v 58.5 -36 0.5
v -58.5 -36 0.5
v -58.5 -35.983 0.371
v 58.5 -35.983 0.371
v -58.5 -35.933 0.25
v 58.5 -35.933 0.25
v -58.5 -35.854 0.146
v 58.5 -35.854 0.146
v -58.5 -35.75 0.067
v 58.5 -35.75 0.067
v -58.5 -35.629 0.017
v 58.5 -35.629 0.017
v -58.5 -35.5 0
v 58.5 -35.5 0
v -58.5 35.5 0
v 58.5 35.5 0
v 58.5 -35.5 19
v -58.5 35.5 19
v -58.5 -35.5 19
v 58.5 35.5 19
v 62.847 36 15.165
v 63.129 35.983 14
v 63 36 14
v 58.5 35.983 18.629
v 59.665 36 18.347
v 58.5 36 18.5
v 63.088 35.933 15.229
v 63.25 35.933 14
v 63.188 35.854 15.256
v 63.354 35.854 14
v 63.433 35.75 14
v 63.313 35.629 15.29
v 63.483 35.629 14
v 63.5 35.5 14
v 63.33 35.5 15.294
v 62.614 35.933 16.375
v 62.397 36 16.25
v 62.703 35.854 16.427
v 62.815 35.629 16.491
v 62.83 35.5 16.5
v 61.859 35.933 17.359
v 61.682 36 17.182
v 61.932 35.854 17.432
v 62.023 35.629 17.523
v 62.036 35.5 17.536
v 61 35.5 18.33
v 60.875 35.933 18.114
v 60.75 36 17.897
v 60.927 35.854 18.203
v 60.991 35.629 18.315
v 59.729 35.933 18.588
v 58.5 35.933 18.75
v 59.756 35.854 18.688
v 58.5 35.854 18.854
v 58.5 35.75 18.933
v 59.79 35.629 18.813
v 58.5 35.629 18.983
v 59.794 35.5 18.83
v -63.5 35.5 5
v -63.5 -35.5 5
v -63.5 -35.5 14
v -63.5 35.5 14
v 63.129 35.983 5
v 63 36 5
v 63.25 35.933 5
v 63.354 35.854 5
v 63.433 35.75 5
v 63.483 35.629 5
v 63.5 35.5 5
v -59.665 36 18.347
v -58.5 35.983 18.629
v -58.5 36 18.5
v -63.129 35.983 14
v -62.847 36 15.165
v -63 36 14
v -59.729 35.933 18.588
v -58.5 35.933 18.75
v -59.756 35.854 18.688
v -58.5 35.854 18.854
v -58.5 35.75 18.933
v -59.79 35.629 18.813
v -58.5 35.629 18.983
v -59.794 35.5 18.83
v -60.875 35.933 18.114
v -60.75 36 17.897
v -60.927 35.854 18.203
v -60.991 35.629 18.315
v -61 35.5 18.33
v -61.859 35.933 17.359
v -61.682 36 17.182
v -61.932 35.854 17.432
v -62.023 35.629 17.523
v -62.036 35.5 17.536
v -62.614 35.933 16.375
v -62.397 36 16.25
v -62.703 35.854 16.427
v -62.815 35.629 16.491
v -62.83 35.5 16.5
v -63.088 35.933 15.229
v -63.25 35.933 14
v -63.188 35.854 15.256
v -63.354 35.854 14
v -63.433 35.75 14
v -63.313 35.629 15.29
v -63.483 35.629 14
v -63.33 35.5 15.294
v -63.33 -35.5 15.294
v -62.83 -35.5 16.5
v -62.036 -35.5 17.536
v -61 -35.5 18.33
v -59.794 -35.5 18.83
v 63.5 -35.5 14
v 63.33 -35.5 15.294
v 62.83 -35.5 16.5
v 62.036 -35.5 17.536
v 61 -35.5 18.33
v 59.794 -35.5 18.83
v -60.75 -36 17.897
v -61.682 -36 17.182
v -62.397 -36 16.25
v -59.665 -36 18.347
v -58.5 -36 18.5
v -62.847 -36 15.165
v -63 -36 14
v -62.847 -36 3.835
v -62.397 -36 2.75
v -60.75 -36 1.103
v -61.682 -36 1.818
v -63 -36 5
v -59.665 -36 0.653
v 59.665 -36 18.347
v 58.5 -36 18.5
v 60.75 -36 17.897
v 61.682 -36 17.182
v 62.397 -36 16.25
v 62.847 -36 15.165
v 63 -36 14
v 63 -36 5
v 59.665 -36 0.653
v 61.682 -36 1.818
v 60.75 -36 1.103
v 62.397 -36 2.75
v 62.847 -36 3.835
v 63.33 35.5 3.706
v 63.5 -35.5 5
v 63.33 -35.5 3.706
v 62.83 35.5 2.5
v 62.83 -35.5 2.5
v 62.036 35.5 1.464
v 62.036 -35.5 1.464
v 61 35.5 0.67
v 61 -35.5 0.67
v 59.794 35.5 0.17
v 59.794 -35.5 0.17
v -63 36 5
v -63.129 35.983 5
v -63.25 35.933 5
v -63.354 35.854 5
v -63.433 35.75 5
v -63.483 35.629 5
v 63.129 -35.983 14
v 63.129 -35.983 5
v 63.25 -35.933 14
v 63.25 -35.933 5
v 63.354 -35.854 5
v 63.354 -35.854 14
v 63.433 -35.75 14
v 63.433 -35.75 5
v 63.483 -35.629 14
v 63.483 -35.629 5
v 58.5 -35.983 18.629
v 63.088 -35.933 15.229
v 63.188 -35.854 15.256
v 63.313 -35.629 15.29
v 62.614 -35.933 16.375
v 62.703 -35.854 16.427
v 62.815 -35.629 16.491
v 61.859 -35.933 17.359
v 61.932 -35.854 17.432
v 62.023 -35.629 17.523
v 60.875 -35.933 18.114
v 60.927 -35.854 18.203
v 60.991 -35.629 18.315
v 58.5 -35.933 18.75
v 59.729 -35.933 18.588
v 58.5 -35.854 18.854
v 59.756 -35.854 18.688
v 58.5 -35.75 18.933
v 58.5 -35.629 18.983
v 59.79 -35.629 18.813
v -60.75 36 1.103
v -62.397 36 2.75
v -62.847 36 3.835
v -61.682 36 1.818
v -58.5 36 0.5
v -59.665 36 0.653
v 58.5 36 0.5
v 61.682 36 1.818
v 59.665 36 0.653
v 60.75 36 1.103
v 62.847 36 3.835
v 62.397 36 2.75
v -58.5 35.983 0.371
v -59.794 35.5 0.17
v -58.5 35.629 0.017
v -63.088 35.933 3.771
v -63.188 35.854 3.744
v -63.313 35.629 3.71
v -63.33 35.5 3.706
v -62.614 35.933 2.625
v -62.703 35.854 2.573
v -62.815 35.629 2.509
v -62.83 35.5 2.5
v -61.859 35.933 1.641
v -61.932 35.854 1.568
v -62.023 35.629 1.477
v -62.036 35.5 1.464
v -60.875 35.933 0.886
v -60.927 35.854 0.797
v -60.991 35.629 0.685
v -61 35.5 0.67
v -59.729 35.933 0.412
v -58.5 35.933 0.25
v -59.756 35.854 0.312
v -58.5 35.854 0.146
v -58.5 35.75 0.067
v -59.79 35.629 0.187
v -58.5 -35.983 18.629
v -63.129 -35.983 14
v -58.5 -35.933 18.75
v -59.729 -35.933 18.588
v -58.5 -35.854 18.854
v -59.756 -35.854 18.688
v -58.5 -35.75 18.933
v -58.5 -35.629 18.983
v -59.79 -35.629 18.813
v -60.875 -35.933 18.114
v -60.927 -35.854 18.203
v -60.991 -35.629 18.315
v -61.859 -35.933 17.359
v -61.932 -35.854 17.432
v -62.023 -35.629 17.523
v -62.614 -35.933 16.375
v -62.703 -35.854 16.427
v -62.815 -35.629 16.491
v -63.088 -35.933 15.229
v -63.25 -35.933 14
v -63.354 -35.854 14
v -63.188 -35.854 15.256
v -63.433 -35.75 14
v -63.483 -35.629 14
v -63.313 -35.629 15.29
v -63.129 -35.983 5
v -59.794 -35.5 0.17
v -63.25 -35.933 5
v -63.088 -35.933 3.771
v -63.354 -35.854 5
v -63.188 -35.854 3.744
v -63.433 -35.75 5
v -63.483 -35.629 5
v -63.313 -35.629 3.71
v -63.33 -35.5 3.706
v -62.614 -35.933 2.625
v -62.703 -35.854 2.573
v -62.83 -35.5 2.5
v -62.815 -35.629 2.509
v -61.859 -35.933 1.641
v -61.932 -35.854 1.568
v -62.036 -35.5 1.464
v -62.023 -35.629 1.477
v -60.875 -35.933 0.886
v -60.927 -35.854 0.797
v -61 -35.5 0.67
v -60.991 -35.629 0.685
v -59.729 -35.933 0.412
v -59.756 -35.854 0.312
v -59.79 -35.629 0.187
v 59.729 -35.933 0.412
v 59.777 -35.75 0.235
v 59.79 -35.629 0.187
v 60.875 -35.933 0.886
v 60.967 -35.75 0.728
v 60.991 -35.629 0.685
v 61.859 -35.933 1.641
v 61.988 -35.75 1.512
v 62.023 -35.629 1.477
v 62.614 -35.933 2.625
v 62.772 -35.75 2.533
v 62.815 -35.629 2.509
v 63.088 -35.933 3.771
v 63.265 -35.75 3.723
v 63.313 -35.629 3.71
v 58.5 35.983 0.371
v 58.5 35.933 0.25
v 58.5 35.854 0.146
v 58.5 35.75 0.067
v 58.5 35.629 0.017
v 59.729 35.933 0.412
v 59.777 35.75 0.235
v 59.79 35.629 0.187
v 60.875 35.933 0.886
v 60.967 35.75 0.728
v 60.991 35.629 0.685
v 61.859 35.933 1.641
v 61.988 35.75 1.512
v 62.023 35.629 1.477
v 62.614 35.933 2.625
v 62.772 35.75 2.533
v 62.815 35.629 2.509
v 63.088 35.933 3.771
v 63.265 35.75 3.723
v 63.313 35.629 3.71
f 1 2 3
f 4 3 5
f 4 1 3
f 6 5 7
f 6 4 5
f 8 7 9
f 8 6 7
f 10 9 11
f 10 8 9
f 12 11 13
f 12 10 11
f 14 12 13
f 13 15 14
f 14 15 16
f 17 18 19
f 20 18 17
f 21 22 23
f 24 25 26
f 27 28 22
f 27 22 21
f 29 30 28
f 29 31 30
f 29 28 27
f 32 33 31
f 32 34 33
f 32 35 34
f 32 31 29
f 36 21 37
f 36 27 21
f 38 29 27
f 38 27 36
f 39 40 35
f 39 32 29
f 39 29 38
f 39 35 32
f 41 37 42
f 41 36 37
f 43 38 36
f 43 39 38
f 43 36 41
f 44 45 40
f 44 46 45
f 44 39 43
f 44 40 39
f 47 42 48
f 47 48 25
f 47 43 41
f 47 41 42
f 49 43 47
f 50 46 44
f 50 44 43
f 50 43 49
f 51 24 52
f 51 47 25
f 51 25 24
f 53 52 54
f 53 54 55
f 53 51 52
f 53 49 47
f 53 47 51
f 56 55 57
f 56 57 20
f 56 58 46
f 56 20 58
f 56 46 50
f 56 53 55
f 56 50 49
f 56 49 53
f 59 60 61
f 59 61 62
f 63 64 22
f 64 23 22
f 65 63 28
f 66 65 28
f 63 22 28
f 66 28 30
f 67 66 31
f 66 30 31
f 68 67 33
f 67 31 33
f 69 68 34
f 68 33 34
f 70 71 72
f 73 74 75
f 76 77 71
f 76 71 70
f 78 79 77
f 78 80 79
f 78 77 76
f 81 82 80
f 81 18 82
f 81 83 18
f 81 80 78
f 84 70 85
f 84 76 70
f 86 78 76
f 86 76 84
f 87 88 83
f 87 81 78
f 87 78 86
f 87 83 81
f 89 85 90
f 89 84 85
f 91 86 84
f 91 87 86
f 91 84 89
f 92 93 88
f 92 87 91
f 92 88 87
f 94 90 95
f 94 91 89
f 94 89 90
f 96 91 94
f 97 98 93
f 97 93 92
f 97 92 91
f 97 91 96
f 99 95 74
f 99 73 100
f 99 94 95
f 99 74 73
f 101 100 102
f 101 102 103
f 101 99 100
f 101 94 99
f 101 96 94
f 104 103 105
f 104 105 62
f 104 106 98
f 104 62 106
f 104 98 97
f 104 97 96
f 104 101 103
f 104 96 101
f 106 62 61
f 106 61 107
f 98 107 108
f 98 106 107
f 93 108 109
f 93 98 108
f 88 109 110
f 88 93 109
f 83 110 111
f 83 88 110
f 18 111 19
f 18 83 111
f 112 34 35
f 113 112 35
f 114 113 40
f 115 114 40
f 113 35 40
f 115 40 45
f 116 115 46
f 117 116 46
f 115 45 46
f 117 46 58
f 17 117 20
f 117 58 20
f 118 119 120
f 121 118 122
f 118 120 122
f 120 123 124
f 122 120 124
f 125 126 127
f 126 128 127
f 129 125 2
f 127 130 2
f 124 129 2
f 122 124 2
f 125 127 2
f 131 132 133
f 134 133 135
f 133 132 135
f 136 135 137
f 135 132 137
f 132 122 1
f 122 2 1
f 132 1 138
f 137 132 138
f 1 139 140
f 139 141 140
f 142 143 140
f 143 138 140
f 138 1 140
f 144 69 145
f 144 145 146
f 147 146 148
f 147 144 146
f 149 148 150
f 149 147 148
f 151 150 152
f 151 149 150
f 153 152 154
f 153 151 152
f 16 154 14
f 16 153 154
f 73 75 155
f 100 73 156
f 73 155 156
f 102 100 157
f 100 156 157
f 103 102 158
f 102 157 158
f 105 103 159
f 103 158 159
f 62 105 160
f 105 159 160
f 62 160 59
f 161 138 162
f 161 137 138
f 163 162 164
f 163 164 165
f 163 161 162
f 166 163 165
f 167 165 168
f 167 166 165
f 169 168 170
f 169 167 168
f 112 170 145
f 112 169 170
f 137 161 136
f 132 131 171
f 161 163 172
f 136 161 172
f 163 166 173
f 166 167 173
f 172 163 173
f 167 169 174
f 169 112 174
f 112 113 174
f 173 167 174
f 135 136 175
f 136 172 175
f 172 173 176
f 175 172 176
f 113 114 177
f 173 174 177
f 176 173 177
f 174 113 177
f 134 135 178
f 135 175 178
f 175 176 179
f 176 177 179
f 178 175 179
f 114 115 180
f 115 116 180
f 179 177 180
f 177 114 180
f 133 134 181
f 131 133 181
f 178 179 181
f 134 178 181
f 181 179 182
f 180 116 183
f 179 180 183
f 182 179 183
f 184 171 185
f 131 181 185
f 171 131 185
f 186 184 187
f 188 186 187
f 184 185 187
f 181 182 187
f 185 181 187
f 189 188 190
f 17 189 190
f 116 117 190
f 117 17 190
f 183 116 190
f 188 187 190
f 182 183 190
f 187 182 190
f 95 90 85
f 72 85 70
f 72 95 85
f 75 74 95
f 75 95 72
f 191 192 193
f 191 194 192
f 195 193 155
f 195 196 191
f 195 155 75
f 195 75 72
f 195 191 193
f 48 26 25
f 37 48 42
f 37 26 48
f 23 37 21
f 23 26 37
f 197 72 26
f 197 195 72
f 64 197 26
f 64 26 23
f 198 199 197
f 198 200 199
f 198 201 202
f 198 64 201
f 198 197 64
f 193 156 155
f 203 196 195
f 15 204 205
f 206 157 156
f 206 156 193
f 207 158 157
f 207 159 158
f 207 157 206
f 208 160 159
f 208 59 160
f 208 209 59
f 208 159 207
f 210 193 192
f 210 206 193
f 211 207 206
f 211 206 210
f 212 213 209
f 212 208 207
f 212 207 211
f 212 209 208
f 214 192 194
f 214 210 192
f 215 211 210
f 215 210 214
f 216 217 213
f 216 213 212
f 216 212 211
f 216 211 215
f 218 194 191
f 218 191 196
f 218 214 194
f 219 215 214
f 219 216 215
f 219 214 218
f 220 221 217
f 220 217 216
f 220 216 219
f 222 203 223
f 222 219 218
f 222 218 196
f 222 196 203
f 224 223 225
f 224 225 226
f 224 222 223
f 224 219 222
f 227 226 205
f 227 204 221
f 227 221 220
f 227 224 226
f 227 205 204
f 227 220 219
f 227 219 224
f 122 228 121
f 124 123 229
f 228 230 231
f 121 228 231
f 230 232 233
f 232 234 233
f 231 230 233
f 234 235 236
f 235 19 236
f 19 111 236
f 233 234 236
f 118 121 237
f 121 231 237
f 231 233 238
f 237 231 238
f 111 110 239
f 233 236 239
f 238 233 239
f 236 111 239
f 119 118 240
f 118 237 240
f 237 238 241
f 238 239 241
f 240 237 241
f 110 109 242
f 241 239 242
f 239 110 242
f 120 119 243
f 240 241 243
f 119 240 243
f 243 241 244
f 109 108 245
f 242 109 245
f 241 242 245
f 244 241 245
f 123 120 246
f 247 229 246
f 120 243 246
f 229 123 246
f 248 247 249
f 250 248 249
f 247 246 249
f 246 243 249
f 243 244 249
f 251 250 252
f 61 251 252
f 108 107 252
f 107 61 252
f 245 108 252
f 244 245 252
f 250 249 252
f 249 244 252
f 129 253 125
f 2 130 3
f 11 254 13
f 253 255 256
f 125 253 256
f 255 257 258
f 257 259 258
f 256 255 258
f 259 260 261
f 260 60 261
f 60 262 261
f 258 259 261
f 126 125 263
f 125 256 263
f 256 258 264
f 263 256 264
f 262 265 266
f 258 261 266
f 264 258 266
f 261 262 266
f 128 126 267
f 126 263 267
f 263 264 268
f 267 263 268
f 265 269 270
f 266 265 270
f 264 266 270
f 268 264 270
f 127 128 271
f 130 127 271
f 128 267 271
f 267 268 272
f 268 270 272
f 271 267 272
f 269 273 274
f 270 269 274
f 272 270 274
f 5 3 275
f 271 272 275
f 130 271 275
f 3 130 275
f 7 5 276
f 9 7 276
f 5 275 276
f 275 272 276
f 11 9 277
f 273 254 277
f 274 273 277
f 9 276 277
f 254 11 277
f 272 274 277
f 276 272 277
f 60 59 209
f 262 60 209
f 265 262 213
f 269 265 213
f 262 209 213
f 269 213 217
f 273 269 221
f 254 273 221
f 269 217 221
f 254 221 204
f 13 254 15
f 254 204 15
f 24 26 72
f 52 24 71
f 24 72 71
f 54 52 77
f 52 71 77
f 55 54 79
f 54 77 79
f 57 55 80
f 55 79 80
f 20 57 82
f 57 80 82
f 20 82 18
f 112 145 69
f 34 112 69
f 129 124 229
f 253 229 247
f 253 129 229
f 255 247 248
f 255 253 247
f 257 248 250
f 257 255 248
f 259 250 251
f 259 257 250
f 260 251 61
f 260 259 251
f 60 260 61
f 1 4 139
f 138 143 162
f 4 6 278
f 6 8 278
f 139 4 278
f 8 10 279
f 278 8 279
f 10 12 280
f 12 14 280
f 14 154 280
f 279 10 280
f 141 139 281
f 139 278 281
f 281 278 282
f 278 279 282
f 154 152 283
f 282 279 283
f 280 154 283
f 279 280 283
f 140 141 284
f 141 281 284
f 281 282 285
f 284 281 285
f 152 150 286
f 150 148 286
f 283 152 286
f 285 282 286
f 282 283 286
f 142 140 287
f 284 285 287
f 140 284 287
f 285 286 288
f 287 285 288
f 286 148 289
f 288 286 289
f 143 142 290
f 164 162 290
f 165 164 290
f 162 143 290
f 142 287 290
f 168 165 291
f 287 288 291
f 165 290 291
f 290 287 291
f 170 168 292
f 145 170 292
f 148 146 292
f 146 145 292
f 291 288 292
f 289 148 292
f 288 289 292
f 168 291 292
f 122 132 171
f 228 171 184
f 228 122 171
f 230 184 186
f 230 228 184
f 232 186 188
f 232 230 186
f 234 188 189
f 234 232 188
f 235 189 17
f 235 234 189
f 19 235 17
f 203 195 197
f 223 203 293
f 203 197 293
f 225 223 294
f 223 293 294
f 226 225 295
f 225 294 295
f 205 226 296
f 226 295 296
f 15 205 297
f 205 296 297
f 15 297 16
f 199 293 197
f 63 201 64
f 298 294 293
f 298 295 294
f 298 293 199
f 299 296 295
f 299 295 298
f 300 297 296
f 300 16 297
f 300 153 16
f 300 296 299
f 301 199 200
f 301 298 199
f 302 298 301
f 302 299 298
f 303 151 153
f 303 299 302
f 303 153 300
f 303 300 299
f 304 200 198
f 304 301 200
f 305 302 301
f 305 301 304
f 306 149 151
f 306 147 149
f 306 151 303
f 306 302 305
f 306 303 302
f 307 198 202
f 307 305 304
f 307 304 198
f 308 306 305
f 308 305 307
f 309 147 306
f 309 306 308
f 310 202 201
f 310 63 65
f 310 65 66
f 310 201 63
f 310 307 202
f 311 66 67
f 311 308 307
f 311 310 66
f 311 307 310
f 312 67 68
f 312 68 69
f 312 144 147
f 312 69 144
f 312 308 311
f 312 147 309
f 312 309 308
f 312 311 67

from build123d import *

# Parameters (mm, degrees)
ESQUISSE1_W        = 127
ESQUISSE1_H        = 72
BOSS_EXTRU_1_DEPTH = 19
CONG_1_R           = 5
CONG_2_R           = 0.5


with BuildPart() as part:
    # Esquisse1 → Boss.-Extru.1 (new body)
    with BuildSketch(Plane.XY):
        Rectangle(ESQUISSE1_W, ESQUISSE1_H)
    extrude(amount=BOSS_EXTRU_1_DEPTH)

    # Congé1
    cong_1_edges = [part.edges().sort_by_distance(p)[0] for p in [
        (-63.5, 0, 19),
        (63.5, 0, 19),
        (-63.5, 0, 0),
        (63.5, 0, 0),
    ]]
    fillet(cong_1_edges, radius=CONG_1_R)

    # Congé2
    cong_2_edges = [part.edges().sort_by_distance(p)[0] for p in [
        (63.5, 36, 9.5),
        (63.5, -36, 9.5),
        (0, 36, 0),
        (-63.5, 36, 9.5),
        (0, 36, 19),
        (-62.035533906, 36, 17.535533906),
        (-62.035533906, 36, 1.464466094),
        (62.035533906, 36, 17.535533906),
        (62.035533906, 36, 1.464466094),
        (0, -36, 0),
        (0, -36, 19),
        (-63.5, -36, 9.5),
        (-62.035533906, -36, 17.535533906),
        (-62.035533906, -36, 1.464466094),
        (62.035533906, -36, 17.535533906),
        (62.035533906, -36, 1.464466094),
    ]]
    fillet(cong_2_edges, radius=CONG_2_R)


solid = part.part
